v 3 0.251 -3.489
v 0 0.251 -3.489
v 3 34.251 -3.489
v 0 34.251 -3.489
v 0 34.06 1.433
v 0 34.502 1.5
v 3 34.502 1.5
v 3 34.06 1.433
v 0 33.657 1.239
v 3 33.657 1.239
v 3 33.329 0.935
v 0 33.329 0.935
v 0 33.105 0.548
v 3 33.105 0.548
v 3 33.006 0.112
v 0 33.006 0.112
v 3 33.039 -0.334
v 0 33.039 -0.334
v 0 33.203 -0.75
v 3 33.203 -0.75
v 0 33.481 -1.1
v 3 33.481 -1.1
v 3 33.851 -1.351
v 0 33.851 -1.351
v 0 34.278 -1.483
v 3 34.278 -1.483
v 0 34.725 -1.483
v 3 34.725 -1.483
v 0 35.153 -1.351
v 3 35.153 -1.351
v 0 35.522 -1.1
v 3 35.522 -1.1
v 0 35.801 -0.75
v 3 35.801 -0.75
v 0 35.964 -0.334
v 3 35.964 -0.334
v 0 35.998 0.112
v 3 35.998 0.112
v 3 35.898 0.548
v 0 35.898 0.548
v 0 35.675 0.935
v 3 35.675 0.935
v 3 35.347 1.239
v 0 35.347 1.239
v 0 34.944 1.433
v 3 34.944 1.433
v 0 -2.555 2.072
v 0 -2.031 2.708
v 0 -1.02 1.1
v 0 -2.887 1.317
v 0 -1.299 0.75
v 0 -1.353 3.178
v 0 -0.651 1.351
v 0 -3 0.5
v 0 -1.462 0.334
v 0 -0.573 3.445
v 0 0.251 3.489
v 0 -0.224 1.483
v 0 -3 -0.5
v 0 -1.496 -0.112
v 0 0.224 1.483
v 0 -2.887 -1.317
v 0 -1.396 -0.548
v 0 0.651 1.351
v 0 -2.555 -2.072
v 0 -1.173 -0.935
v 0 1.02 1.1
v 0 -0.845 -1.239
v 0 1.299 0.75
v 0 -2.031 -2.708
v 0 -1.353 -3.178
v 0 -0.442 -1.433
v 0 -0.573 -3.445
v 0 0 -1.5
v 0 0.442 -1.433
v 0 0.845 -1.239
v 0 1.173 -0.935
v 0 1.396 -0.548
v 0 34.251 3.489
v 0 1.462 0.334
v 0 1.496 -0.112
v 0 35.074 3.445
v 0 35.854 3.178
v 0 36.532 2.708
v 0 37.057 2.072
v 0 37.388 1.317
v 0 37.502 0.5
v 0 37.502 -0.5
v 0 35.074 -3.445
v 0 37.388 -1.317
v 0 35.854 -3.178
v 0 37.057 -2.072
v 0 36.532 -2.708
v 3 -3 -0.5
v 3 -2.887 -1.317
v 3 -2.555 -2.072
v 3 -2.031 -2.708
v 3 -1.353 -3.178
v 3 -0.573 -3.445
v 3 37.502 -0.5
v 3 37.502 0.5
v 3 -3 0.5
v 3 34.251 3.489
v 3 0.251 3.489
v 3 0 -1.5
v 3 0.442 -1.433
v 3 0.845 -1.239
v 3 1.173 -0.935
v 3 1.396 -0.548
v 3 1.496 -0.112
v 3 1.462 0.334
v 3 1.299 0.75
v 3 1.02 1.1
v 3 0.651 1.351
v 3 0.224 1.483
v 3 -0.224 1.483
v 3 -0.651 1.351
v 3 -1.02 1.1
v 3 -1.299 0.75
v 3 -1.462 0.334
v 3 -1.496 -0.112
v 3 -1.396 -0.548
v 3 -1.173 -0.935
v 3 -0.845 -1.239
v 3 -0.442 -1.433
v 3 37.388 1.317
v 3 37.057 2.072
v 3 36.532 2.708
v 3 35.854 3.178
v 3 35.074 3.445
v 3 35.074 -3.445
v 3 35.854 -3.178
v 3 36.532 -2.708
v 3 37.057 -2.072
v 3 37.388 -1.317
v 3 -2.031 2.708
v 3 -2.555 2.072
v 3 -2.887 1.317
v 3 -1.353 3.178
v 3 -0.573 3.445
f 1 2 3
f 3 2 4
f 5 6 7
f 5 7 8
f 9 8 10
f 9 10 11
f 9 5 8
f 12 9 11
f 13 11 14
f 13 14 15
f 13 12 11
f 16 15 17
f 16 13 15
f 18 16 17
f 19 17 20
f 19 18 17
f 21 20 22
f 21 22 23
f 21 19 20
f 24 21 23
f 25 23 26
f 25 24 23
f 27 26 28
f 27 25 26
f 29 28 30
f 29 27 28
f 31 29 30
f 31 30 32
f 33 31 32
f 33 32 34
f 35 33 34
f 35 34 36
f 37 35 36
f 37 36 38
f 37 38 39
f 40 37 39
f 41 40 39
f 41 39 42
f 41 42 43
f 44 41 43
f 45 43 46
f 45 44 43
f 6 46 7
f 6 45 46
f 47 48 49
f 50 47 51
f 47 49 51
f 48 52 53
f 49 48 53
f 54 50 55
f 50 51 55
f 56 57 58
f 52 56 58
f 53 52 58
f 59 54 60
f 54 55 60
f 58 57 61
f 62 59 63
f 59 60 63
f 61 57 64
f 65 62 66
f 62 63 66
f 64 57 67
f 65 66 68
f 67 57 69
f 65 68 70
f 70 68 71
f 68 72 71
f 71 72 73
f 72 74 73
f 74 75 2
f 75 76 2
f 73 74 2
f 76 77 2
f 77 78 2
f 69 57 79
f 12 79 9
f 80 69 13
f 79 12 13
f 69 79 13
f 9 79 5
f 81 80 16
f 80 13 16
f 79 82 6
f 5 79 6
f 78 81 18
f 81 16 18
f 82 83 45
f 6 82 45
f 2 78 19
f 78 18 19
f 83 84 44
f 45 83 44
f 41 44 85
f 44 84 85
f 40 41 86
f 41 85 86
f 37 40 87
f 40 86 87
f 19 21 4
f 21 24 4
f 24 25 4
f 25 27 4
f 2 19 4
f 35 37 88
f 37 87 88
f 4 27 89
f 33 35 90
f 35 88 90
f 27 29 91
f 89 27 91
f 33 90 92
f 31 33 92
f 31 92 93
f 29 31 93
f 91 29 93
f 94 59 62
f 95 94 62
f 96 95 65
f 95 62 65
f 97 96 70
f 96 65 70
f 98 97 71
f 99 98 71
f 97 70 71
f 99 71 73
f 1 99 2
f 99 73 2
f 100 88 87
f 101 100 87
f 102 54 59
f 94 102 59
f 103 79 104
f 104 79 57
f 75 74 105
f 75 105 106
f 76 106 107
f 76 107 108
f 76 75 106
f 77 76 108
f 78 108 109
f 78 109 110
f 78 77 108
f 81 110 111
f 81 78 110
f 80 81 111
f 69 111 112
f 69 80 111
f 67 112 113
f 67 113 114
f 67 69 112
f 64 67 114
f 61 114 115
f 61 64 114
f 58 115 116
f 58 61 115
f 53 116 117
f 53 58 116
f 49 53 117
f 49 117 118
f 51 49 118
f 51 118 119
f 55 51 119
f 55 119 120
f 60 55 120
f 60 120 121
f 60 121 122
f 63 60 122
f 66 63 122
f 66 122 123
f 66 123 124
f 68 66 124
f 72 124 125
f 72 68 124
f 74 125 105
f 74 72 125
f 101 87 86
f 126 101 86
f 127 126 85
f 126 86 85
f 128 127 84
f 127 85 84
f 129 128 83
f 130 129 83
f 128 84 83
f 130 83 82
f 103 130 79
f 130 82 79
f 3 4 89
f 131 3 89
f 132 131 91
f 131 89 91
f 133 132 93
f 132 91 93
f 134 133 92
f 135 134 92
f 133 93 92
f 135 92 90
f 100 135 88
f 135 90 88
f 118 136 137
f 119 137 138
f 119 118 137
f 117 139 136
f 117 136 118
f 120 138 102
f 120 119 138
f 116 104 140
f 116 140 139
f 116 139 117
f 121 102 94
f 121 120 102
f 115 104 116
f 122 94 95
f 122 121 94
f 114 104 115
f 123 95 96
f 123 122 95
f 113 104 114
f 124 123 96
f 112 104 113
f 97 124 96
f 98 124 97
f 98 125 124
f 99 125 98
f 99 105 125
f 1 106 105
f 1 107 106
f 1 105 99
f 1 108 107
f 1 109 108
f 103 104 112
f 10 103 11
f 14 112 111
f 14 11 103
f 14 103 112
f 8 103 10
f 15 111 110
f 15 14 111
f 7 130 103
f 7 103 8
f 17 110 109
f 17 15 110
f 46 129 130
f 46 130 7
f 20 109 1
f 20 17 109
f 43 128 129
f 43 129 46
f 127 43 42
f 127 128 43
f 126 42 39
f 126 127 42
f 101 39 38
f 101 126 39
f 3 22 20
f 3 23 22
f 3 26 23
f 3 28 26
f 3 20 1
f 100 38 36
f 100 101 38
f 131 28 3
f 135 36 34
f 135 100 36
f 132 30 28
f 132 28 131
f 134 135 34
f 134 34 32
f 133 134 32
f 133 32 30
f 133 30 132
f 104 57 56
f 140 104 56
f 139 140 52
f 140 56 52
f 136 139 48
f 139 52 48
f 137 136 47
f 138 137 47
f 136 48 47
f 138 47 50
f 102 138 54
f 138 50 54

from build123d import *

# Parameters (mm, degrees)
SKETCH1_R           = 1.5
BOSS_EXTRUDE1_DEPTH = 3


with BuildPart() as part:
    # Sketch1 → Boss-Extrude1 (new body)
    with BuildSketch(Plane(origin=(0, 0, 0), x_dir=(0, 0, -1), z_dir=(1, 0, 0))):
        with BuildLine():
            Line((-0.5, -3), (0.5, -3))
            ThreePointArc((0.5, -3), (2.708238703, -2.030685064), (3.489491568, 0.250878781))
            Line((3.489491568, 0.250878781), (3.489491568, 34.250878781))
            ThreePointArc((3.489491568, 34.250878781), (2.708238703, 36.532442626), (0.5, 37.501757562))
            Line((0.5, 37.501757562), (-0.5, 37.501757562))
            ThreePointArc((-0.5, 37.501757562), (-2.708238703, 36.532442626), (-3.489491568, 34.250878781))
            Line((-3.489491568, 34.250878781), (-3.489491568, 0.250878781))
            ThreePointArc((-3.489491568, 0.250878781), (-2.708238703, -2.030685064), (-0.5, -3))
        make_face()
        Circle(SKETCH1_R, mode=Mode.SUBTRACT)
        with Locations(Location((0, 34.501757562, 0), (0, 0, 180))):
            Circle(SKETCH1_R, mode=Mode.SUBTRACT)
    extrude(amount=BOSS_EXTRUDE1_DEPTH)


solid = part.part
